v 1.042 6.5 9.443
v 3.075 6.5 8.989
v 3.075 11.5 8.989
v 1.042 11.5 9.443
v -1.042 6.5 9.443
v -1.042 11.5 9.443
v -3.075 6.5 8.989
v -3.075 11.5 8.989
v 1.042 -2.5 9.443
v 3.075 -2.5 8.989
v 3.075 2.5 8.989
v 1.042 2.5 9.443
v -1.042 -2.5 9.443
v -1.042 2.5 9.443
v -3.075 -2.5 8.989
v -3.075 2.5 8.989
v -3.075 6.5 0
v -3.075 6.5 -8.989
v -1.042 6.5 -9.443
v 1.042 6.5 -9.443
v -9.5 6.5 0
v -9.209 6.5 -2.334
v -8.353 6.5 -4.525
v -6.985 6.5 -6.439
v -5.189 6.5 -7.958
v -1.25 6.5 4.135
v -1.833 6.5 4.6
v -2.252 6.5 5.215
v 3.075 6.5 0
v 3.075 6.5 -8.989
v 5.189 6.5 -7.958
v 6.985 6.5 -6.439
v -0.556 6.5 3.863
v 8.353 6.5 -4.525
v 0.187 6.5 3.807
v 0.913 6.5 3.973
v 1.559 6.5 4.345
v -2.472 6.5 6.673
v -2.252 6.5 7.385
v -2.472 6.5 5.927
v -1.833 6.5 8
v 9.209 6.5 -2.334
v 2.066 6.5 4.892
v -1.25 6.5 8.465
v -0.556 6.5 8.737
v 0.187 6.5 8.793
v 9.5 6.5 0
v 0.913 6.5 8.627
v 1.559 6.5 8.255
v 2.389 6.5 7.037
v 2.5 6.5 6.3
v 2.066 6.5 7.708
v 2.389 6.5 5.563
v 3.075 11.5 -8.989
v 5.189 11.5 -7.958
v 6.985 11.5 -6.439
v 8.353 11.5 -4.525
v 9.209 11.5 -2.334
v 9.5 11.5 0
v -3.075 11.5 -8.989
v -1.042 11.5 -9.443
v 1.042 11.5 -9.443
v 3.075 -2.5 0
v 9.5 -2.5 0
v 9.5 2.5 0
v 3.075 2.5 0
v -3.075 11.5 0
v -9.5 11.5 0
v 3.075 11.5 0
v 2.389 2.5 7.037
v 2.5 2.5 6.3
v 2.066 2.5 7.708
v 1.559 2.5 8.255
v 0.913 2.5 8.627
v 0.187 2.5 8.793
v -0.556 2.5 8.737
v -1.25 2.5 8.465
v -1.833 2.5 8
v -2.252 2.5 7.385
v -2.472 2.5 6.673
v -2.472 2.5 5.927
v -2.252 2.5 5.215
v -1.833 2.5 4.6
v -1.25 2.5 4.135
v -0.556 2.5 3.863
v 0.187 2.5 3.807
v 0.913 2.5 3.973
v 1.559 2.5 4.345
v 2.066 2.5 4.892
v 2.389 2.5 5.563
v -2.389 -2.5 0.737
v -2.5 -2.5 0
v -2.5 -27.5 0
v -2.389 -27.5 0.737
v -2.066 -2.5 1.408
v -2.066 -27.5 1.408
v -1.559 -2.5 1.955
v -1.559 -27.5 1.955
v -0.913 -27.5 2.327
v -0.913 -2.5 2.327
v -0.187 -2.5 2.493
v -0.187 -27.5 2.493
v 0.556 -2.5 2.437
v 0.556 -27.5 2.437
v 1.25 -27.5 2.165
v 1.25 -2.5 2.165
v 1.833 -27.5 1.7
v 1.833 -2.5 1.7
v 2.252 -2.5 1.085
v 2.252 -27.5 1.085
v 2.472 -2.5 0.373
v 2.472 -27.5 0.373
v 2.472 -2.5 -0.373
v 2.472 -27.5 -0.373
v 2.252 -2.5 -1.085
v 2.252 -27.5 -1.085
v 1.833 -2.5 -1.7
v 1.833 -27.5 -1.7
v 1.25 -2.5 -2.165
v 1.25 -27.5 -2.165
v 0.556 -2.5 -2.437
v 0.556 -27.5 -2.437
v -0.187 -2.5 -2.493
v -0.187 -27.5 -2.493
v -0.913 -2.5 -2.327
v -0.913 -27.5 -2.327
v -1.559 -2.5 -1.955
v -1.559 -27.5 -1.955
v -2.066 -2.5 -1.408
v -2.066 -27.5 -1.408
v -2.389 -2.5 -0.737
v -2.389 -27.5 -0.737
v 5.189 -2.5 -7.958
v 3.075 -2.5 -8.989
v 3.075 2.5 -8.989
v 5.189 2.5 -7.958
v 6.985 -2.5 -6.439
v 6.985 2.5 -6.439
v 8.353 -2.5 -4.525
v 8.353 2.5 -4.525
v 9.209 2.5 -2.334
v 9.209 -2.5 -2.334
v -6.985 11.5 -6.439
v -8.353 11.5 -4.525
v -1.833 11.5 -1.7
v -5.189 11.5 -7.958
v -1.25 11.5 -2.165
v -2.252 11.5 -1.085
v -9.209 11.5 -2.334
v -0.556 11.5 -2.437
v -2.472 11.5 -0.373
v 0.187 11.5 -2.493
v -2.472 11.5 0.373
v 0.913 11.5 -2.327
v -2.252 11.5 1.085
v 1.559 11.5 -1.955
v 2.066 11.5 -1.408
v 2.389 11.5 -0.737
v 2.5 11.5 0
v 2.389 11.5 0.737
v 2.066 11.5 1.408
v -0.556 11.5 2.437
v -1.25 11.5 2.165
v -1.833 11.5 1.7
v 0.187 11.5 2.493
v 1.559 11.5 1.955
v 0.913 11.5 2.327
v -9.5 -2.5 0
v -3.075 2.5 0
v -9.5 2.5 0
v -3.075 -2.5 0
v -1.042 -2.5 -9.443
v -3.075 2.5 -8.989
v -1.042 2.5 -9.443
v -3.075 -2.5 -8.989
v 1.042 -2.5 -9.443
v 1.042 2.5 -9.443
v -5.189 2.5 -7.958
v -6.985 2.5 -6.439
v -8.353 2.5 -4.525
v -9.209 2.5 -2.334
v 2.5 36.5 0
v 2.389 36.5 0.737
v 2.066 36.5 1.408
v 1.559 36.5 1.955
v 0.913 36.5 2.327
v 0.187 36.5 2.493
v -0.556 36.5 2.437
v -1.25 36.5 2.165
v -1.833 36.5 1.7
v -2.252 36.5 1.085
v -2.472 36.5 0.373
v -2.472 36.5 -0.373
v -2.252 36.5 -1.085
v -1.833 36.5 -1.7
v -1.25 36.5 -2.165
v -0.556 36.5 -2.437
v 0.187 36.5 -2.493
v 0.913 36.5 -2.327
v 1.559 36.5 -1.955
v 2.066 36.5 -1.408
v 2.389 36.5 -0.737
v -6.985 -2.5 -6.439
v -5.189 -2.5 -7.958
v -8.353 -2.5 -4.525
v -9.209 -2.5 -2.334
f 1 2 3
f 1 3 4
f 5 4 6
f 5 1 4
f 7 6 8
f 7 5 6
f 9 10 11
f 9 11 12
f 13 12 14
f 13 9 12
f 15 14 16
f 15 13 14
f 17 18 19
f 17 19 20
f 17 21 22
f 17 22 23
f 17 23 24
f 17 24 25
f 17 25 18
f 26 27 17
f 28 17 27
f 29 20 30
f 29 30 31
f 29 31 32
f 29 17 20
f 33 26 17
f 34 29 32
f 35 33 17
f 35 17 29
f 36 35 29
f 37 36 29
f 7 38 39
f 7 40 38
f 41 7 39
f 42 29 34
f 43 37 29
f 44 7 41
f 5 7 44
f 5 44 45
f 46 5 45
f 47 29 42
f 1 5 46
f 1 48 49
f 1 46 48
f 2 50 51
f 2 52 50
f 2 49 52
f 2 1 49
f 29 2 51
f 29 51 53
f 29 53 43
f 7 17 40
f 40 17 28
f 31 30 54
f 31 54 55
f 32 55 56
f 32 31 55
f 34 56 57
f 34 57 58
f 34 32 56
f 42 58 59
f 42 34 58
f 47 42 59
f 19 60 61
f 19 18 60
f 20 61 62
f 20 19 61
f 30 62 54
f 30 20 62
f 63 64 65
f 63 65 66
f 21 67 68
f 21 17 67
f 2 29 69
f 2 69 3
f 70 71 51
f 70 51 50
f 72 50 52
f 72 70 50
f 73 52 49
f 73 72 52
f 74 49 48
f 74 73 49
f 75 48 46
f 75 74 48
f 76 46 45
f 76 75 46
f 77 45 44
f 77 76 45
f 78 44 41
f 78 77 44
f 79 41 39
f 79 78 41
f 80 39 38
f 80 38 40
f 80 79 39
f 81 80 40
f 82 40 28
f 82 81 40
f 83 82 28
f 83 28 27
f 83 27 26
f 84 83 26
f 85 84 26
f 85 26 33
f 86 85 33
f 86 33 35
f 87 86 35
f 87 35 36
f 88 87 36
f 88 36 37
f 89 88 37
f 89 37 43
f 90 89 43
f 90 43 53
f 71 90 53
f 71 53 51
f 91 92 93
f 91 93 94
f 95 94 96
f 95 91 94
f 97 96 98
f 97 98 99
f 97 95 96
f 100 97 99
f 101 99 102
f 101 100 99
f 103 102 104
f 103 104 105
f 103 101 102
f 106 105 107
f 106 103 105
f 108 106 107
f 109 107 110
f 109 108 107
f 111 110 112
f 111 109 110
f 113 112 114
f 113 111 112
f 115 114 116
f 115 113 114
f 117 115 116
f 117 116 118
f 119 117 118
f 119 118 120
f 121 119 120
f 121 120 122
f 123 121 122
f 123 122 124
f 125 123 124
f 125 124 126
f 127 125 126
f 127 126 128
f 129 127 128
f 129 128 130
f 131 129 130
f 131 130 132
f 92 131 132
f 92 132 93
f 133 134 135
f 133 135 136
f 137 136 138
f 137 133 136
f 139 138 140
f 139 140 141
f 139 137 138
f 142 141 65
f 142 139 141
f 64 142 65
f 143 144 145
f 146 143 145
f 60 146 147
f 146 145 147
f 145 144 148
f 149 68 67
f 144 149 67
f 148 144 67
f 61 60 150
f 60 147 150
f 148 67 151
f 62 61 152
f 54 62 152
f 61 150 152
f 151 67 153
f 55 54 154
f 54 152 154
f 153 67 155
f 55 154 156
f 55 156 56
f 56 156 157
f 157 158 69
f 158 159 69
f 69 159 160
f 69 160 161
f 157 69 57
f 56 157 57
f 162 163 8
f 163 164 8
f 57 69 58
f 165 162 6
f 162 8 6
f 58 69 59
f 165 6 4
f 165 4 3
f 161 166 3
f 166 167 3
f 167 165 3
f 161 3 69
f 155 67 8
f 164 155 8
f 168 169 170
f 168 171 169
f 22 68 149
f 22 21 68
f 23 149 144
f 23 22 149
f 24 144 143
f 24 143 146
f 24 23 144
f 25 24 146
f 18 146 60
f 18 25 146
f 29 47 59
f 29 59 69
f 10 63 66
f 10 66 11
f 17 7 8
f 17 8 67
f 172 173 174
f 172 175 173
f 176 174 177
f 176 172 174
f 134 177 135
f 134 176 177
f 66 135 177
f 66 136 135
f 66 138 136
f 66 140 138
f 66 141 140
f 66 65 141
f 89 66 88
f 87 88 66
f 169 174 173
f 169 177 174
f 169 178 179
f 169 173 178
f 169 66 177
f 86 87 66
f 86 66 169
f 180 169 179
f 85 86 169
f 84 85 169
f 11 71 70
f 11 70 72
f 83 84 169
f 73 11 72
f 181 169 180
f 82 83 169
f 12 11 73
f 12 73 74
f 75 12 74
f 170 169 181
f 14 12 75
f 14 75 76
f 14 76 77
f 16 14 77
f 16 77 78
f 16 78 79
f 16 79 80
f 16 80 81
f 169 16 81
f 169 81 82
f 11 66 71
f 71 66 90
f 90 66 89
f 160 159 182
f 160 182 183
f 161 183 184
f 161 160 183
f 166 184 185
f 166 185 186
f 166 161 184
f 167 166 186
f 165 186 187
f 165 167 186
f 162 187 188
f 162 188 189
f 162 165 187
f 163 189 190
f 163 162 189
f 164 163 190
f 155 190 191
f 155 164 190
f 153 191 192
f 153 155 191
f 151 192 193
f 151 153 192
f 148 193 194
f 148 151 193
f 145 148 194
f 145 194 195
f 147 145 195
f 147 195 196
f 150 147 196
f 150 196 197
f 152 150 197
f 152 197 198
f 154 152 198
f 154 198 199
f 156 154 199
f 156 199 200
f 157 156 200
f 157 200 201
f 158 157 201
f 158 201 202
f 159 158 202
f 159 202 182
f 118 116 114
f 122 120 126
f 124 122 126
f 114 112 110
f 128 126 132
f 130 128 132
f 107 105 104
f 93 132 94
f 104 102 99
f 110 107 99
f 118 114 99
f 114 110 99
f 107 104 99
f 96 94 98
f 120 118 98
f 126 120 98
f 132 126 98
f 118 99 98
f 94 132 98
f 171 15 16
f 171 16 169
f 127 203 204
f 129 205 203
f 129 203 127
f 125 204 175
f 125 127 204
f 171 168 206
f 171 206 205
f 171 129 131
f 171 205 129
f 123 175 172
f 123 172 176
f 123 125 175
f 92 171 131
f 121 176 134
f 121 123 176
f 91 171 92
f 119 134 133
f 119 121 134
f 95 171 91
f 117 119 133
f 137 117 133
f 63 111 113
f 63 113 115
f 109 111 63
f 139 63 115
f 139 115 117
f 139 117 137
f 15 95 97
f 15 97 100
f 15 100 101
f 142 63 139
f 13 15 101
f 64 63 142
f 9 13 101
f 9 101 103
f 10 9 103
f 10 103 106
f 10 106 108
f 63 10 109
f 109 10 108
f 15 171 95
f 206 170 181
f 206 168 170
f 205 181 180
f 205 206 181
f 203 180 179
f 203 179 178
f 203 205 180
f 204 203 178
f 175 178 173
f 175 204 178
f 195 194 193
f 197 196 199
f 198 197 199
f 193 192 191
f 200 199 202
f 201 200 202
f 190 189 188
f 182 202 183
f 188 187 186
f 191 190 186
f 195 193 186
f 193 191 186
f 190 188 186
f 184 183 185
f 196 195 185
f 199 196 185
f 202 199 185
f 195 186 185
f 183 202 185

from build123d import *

# Parameters (mm, degrees)
F1_DEPTH = 2.5
F2_R     = 2.5
F4_DEPTH = 14
F5_R     = 2.5
F6_DEPTH = 30
F7_R     = 2.5
F8_DEPTH = 30


# Not quite as in the source:
# - a feature names something its author has since deleted; it is built from what else it names


with BuildPart() as f1:
    # F0 (on Front) → F1 (new body, symmetric)
    with BuildSketch(Plane.XZ):
        with BuildLine():
            ThreePointArc((-3.0750329511, -8.9885578571), (0, -9.5), (3.0750329511, -8.9885578571))
            Line((3.0750329511, -8.9885578571), (3.0750329511, 0))
            Line((3.0750329511, 0), (3.0750329511, 8.9885578571))
            ThreePointArc((3.0750329511, 8.9885578571), (0, 9.5), (-3.0750329511, 8.9885578571))
            Line((-3.0750329511, 8.9885578571), (-3.0750329511, 0))
            Line((-3.0750329511, 0), (-3.0750329511, -8.9885578571))
        make_face()
        with BuildLine():
            ThreePointArc((-9.5, 0), (-7.7286096109, -5.5243636269), (-3.0750329511, -8.9885578571))
            Line((-3.0750329511, -8.9885578571), (-3.0750329511, 0))
            Line((-3.0750329511, 0), (-9.5, 0))
        make_face()
        with BuildLine():
            Line((3.0750329511, 0), (3.0750329511, -8.9885578571))
            ThreePointArc((3.0750329511, -8.9885578571), (7.7286096109, -5.5243636269), (9.5, 0))
            Line((9.5, 0), (3.0750329511, 0))
        make_face()
    extrude(amount=F1_DEPTH, both=True)


with BuildPart() as f3_1:
    # F3: copy of F1
    add(f1.part.moved(Location((0, 9, 0))))


with BuildPart() as f1_1:
    add(f1.part)

    add(f3_1.part)  # F4 merges F3_1
    # F2 (on face) → F4 (join, through all)
    with BuildSketch(Plane.XZ.offset(2.5)):
        with Locations((0, 6.3)):
            Circle(F2_R)
    extrude(amount=-F4_DEPTH)

    # F5 (on face) → F6 (join)
    with BuildSketch(Plane(origin=(0, 2.5, 0), x_dir=(-1, 0, 0), z_dir=(0, 1, 0))):
        Circle(F5_R)
    extrude(amount=-F6_DEPTH)

    # F7 (on face) → F8 (join)
    with BuildSketch(Plane.XZ.offset(-6.5)):
        Circle(F7_R)
    extrude(amount=-F8_DEPTH)


solid = f1_1.part
